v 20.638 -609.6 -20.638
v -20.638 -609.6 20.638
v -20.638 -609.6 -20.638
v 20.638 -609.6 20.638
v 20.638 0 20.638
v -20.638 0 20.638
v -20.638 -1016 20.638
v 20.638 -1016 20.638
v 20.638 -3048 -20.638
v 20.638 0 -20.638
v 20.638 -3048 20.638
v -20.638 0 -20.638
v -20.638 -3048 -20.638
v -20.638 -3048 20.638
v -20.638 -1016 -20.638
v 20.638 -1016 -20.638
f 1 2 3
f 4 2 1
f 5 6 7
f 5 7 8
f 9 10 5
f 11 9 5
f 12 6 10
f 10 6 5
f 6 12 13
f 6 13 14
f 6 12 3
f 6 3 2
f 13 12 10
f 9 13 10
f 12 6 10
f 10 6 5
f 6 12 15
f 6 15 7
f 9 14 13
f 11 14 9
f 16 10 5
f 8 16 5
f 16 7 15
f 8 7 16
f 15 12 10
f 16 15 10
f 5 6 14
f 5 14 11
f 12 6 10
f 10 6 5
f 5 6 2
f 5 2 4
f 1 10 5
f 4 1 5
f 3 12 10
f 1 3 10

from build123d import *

# Parameters (mm, degrees)
F0_W     = 41.275
F0_H     = 41.275
F1_DEPTH = 609.6
F2_DEPTH = 1016
F3_DEPTH = 3048


with BuildPart() as f1:
    # F0 (on Front) → F1 (new body)
    with BuildSketch(Plane.XZ):
        Rectangle(F0_W, F0_H)
    extrude(amount=F1_DEPTH)


with BuildPart() as f2:
    # F0 (on Front) → F2 (new body)
    with BuildSketch(Plane.XZ):
        Rectangle(F0_W, F0_H)
    extrude(amount=F2_DEPTH)


with BuildPart() as f3:
    # F0 (on Front) → F3 (new body)
    with BuildSketch(Plane.XZ):
        Rectangle(F0_W, F0_H)
    extrude(amount=F3_DEPTH)


solid = Compound([f1.part, f2.part, f3.part])
